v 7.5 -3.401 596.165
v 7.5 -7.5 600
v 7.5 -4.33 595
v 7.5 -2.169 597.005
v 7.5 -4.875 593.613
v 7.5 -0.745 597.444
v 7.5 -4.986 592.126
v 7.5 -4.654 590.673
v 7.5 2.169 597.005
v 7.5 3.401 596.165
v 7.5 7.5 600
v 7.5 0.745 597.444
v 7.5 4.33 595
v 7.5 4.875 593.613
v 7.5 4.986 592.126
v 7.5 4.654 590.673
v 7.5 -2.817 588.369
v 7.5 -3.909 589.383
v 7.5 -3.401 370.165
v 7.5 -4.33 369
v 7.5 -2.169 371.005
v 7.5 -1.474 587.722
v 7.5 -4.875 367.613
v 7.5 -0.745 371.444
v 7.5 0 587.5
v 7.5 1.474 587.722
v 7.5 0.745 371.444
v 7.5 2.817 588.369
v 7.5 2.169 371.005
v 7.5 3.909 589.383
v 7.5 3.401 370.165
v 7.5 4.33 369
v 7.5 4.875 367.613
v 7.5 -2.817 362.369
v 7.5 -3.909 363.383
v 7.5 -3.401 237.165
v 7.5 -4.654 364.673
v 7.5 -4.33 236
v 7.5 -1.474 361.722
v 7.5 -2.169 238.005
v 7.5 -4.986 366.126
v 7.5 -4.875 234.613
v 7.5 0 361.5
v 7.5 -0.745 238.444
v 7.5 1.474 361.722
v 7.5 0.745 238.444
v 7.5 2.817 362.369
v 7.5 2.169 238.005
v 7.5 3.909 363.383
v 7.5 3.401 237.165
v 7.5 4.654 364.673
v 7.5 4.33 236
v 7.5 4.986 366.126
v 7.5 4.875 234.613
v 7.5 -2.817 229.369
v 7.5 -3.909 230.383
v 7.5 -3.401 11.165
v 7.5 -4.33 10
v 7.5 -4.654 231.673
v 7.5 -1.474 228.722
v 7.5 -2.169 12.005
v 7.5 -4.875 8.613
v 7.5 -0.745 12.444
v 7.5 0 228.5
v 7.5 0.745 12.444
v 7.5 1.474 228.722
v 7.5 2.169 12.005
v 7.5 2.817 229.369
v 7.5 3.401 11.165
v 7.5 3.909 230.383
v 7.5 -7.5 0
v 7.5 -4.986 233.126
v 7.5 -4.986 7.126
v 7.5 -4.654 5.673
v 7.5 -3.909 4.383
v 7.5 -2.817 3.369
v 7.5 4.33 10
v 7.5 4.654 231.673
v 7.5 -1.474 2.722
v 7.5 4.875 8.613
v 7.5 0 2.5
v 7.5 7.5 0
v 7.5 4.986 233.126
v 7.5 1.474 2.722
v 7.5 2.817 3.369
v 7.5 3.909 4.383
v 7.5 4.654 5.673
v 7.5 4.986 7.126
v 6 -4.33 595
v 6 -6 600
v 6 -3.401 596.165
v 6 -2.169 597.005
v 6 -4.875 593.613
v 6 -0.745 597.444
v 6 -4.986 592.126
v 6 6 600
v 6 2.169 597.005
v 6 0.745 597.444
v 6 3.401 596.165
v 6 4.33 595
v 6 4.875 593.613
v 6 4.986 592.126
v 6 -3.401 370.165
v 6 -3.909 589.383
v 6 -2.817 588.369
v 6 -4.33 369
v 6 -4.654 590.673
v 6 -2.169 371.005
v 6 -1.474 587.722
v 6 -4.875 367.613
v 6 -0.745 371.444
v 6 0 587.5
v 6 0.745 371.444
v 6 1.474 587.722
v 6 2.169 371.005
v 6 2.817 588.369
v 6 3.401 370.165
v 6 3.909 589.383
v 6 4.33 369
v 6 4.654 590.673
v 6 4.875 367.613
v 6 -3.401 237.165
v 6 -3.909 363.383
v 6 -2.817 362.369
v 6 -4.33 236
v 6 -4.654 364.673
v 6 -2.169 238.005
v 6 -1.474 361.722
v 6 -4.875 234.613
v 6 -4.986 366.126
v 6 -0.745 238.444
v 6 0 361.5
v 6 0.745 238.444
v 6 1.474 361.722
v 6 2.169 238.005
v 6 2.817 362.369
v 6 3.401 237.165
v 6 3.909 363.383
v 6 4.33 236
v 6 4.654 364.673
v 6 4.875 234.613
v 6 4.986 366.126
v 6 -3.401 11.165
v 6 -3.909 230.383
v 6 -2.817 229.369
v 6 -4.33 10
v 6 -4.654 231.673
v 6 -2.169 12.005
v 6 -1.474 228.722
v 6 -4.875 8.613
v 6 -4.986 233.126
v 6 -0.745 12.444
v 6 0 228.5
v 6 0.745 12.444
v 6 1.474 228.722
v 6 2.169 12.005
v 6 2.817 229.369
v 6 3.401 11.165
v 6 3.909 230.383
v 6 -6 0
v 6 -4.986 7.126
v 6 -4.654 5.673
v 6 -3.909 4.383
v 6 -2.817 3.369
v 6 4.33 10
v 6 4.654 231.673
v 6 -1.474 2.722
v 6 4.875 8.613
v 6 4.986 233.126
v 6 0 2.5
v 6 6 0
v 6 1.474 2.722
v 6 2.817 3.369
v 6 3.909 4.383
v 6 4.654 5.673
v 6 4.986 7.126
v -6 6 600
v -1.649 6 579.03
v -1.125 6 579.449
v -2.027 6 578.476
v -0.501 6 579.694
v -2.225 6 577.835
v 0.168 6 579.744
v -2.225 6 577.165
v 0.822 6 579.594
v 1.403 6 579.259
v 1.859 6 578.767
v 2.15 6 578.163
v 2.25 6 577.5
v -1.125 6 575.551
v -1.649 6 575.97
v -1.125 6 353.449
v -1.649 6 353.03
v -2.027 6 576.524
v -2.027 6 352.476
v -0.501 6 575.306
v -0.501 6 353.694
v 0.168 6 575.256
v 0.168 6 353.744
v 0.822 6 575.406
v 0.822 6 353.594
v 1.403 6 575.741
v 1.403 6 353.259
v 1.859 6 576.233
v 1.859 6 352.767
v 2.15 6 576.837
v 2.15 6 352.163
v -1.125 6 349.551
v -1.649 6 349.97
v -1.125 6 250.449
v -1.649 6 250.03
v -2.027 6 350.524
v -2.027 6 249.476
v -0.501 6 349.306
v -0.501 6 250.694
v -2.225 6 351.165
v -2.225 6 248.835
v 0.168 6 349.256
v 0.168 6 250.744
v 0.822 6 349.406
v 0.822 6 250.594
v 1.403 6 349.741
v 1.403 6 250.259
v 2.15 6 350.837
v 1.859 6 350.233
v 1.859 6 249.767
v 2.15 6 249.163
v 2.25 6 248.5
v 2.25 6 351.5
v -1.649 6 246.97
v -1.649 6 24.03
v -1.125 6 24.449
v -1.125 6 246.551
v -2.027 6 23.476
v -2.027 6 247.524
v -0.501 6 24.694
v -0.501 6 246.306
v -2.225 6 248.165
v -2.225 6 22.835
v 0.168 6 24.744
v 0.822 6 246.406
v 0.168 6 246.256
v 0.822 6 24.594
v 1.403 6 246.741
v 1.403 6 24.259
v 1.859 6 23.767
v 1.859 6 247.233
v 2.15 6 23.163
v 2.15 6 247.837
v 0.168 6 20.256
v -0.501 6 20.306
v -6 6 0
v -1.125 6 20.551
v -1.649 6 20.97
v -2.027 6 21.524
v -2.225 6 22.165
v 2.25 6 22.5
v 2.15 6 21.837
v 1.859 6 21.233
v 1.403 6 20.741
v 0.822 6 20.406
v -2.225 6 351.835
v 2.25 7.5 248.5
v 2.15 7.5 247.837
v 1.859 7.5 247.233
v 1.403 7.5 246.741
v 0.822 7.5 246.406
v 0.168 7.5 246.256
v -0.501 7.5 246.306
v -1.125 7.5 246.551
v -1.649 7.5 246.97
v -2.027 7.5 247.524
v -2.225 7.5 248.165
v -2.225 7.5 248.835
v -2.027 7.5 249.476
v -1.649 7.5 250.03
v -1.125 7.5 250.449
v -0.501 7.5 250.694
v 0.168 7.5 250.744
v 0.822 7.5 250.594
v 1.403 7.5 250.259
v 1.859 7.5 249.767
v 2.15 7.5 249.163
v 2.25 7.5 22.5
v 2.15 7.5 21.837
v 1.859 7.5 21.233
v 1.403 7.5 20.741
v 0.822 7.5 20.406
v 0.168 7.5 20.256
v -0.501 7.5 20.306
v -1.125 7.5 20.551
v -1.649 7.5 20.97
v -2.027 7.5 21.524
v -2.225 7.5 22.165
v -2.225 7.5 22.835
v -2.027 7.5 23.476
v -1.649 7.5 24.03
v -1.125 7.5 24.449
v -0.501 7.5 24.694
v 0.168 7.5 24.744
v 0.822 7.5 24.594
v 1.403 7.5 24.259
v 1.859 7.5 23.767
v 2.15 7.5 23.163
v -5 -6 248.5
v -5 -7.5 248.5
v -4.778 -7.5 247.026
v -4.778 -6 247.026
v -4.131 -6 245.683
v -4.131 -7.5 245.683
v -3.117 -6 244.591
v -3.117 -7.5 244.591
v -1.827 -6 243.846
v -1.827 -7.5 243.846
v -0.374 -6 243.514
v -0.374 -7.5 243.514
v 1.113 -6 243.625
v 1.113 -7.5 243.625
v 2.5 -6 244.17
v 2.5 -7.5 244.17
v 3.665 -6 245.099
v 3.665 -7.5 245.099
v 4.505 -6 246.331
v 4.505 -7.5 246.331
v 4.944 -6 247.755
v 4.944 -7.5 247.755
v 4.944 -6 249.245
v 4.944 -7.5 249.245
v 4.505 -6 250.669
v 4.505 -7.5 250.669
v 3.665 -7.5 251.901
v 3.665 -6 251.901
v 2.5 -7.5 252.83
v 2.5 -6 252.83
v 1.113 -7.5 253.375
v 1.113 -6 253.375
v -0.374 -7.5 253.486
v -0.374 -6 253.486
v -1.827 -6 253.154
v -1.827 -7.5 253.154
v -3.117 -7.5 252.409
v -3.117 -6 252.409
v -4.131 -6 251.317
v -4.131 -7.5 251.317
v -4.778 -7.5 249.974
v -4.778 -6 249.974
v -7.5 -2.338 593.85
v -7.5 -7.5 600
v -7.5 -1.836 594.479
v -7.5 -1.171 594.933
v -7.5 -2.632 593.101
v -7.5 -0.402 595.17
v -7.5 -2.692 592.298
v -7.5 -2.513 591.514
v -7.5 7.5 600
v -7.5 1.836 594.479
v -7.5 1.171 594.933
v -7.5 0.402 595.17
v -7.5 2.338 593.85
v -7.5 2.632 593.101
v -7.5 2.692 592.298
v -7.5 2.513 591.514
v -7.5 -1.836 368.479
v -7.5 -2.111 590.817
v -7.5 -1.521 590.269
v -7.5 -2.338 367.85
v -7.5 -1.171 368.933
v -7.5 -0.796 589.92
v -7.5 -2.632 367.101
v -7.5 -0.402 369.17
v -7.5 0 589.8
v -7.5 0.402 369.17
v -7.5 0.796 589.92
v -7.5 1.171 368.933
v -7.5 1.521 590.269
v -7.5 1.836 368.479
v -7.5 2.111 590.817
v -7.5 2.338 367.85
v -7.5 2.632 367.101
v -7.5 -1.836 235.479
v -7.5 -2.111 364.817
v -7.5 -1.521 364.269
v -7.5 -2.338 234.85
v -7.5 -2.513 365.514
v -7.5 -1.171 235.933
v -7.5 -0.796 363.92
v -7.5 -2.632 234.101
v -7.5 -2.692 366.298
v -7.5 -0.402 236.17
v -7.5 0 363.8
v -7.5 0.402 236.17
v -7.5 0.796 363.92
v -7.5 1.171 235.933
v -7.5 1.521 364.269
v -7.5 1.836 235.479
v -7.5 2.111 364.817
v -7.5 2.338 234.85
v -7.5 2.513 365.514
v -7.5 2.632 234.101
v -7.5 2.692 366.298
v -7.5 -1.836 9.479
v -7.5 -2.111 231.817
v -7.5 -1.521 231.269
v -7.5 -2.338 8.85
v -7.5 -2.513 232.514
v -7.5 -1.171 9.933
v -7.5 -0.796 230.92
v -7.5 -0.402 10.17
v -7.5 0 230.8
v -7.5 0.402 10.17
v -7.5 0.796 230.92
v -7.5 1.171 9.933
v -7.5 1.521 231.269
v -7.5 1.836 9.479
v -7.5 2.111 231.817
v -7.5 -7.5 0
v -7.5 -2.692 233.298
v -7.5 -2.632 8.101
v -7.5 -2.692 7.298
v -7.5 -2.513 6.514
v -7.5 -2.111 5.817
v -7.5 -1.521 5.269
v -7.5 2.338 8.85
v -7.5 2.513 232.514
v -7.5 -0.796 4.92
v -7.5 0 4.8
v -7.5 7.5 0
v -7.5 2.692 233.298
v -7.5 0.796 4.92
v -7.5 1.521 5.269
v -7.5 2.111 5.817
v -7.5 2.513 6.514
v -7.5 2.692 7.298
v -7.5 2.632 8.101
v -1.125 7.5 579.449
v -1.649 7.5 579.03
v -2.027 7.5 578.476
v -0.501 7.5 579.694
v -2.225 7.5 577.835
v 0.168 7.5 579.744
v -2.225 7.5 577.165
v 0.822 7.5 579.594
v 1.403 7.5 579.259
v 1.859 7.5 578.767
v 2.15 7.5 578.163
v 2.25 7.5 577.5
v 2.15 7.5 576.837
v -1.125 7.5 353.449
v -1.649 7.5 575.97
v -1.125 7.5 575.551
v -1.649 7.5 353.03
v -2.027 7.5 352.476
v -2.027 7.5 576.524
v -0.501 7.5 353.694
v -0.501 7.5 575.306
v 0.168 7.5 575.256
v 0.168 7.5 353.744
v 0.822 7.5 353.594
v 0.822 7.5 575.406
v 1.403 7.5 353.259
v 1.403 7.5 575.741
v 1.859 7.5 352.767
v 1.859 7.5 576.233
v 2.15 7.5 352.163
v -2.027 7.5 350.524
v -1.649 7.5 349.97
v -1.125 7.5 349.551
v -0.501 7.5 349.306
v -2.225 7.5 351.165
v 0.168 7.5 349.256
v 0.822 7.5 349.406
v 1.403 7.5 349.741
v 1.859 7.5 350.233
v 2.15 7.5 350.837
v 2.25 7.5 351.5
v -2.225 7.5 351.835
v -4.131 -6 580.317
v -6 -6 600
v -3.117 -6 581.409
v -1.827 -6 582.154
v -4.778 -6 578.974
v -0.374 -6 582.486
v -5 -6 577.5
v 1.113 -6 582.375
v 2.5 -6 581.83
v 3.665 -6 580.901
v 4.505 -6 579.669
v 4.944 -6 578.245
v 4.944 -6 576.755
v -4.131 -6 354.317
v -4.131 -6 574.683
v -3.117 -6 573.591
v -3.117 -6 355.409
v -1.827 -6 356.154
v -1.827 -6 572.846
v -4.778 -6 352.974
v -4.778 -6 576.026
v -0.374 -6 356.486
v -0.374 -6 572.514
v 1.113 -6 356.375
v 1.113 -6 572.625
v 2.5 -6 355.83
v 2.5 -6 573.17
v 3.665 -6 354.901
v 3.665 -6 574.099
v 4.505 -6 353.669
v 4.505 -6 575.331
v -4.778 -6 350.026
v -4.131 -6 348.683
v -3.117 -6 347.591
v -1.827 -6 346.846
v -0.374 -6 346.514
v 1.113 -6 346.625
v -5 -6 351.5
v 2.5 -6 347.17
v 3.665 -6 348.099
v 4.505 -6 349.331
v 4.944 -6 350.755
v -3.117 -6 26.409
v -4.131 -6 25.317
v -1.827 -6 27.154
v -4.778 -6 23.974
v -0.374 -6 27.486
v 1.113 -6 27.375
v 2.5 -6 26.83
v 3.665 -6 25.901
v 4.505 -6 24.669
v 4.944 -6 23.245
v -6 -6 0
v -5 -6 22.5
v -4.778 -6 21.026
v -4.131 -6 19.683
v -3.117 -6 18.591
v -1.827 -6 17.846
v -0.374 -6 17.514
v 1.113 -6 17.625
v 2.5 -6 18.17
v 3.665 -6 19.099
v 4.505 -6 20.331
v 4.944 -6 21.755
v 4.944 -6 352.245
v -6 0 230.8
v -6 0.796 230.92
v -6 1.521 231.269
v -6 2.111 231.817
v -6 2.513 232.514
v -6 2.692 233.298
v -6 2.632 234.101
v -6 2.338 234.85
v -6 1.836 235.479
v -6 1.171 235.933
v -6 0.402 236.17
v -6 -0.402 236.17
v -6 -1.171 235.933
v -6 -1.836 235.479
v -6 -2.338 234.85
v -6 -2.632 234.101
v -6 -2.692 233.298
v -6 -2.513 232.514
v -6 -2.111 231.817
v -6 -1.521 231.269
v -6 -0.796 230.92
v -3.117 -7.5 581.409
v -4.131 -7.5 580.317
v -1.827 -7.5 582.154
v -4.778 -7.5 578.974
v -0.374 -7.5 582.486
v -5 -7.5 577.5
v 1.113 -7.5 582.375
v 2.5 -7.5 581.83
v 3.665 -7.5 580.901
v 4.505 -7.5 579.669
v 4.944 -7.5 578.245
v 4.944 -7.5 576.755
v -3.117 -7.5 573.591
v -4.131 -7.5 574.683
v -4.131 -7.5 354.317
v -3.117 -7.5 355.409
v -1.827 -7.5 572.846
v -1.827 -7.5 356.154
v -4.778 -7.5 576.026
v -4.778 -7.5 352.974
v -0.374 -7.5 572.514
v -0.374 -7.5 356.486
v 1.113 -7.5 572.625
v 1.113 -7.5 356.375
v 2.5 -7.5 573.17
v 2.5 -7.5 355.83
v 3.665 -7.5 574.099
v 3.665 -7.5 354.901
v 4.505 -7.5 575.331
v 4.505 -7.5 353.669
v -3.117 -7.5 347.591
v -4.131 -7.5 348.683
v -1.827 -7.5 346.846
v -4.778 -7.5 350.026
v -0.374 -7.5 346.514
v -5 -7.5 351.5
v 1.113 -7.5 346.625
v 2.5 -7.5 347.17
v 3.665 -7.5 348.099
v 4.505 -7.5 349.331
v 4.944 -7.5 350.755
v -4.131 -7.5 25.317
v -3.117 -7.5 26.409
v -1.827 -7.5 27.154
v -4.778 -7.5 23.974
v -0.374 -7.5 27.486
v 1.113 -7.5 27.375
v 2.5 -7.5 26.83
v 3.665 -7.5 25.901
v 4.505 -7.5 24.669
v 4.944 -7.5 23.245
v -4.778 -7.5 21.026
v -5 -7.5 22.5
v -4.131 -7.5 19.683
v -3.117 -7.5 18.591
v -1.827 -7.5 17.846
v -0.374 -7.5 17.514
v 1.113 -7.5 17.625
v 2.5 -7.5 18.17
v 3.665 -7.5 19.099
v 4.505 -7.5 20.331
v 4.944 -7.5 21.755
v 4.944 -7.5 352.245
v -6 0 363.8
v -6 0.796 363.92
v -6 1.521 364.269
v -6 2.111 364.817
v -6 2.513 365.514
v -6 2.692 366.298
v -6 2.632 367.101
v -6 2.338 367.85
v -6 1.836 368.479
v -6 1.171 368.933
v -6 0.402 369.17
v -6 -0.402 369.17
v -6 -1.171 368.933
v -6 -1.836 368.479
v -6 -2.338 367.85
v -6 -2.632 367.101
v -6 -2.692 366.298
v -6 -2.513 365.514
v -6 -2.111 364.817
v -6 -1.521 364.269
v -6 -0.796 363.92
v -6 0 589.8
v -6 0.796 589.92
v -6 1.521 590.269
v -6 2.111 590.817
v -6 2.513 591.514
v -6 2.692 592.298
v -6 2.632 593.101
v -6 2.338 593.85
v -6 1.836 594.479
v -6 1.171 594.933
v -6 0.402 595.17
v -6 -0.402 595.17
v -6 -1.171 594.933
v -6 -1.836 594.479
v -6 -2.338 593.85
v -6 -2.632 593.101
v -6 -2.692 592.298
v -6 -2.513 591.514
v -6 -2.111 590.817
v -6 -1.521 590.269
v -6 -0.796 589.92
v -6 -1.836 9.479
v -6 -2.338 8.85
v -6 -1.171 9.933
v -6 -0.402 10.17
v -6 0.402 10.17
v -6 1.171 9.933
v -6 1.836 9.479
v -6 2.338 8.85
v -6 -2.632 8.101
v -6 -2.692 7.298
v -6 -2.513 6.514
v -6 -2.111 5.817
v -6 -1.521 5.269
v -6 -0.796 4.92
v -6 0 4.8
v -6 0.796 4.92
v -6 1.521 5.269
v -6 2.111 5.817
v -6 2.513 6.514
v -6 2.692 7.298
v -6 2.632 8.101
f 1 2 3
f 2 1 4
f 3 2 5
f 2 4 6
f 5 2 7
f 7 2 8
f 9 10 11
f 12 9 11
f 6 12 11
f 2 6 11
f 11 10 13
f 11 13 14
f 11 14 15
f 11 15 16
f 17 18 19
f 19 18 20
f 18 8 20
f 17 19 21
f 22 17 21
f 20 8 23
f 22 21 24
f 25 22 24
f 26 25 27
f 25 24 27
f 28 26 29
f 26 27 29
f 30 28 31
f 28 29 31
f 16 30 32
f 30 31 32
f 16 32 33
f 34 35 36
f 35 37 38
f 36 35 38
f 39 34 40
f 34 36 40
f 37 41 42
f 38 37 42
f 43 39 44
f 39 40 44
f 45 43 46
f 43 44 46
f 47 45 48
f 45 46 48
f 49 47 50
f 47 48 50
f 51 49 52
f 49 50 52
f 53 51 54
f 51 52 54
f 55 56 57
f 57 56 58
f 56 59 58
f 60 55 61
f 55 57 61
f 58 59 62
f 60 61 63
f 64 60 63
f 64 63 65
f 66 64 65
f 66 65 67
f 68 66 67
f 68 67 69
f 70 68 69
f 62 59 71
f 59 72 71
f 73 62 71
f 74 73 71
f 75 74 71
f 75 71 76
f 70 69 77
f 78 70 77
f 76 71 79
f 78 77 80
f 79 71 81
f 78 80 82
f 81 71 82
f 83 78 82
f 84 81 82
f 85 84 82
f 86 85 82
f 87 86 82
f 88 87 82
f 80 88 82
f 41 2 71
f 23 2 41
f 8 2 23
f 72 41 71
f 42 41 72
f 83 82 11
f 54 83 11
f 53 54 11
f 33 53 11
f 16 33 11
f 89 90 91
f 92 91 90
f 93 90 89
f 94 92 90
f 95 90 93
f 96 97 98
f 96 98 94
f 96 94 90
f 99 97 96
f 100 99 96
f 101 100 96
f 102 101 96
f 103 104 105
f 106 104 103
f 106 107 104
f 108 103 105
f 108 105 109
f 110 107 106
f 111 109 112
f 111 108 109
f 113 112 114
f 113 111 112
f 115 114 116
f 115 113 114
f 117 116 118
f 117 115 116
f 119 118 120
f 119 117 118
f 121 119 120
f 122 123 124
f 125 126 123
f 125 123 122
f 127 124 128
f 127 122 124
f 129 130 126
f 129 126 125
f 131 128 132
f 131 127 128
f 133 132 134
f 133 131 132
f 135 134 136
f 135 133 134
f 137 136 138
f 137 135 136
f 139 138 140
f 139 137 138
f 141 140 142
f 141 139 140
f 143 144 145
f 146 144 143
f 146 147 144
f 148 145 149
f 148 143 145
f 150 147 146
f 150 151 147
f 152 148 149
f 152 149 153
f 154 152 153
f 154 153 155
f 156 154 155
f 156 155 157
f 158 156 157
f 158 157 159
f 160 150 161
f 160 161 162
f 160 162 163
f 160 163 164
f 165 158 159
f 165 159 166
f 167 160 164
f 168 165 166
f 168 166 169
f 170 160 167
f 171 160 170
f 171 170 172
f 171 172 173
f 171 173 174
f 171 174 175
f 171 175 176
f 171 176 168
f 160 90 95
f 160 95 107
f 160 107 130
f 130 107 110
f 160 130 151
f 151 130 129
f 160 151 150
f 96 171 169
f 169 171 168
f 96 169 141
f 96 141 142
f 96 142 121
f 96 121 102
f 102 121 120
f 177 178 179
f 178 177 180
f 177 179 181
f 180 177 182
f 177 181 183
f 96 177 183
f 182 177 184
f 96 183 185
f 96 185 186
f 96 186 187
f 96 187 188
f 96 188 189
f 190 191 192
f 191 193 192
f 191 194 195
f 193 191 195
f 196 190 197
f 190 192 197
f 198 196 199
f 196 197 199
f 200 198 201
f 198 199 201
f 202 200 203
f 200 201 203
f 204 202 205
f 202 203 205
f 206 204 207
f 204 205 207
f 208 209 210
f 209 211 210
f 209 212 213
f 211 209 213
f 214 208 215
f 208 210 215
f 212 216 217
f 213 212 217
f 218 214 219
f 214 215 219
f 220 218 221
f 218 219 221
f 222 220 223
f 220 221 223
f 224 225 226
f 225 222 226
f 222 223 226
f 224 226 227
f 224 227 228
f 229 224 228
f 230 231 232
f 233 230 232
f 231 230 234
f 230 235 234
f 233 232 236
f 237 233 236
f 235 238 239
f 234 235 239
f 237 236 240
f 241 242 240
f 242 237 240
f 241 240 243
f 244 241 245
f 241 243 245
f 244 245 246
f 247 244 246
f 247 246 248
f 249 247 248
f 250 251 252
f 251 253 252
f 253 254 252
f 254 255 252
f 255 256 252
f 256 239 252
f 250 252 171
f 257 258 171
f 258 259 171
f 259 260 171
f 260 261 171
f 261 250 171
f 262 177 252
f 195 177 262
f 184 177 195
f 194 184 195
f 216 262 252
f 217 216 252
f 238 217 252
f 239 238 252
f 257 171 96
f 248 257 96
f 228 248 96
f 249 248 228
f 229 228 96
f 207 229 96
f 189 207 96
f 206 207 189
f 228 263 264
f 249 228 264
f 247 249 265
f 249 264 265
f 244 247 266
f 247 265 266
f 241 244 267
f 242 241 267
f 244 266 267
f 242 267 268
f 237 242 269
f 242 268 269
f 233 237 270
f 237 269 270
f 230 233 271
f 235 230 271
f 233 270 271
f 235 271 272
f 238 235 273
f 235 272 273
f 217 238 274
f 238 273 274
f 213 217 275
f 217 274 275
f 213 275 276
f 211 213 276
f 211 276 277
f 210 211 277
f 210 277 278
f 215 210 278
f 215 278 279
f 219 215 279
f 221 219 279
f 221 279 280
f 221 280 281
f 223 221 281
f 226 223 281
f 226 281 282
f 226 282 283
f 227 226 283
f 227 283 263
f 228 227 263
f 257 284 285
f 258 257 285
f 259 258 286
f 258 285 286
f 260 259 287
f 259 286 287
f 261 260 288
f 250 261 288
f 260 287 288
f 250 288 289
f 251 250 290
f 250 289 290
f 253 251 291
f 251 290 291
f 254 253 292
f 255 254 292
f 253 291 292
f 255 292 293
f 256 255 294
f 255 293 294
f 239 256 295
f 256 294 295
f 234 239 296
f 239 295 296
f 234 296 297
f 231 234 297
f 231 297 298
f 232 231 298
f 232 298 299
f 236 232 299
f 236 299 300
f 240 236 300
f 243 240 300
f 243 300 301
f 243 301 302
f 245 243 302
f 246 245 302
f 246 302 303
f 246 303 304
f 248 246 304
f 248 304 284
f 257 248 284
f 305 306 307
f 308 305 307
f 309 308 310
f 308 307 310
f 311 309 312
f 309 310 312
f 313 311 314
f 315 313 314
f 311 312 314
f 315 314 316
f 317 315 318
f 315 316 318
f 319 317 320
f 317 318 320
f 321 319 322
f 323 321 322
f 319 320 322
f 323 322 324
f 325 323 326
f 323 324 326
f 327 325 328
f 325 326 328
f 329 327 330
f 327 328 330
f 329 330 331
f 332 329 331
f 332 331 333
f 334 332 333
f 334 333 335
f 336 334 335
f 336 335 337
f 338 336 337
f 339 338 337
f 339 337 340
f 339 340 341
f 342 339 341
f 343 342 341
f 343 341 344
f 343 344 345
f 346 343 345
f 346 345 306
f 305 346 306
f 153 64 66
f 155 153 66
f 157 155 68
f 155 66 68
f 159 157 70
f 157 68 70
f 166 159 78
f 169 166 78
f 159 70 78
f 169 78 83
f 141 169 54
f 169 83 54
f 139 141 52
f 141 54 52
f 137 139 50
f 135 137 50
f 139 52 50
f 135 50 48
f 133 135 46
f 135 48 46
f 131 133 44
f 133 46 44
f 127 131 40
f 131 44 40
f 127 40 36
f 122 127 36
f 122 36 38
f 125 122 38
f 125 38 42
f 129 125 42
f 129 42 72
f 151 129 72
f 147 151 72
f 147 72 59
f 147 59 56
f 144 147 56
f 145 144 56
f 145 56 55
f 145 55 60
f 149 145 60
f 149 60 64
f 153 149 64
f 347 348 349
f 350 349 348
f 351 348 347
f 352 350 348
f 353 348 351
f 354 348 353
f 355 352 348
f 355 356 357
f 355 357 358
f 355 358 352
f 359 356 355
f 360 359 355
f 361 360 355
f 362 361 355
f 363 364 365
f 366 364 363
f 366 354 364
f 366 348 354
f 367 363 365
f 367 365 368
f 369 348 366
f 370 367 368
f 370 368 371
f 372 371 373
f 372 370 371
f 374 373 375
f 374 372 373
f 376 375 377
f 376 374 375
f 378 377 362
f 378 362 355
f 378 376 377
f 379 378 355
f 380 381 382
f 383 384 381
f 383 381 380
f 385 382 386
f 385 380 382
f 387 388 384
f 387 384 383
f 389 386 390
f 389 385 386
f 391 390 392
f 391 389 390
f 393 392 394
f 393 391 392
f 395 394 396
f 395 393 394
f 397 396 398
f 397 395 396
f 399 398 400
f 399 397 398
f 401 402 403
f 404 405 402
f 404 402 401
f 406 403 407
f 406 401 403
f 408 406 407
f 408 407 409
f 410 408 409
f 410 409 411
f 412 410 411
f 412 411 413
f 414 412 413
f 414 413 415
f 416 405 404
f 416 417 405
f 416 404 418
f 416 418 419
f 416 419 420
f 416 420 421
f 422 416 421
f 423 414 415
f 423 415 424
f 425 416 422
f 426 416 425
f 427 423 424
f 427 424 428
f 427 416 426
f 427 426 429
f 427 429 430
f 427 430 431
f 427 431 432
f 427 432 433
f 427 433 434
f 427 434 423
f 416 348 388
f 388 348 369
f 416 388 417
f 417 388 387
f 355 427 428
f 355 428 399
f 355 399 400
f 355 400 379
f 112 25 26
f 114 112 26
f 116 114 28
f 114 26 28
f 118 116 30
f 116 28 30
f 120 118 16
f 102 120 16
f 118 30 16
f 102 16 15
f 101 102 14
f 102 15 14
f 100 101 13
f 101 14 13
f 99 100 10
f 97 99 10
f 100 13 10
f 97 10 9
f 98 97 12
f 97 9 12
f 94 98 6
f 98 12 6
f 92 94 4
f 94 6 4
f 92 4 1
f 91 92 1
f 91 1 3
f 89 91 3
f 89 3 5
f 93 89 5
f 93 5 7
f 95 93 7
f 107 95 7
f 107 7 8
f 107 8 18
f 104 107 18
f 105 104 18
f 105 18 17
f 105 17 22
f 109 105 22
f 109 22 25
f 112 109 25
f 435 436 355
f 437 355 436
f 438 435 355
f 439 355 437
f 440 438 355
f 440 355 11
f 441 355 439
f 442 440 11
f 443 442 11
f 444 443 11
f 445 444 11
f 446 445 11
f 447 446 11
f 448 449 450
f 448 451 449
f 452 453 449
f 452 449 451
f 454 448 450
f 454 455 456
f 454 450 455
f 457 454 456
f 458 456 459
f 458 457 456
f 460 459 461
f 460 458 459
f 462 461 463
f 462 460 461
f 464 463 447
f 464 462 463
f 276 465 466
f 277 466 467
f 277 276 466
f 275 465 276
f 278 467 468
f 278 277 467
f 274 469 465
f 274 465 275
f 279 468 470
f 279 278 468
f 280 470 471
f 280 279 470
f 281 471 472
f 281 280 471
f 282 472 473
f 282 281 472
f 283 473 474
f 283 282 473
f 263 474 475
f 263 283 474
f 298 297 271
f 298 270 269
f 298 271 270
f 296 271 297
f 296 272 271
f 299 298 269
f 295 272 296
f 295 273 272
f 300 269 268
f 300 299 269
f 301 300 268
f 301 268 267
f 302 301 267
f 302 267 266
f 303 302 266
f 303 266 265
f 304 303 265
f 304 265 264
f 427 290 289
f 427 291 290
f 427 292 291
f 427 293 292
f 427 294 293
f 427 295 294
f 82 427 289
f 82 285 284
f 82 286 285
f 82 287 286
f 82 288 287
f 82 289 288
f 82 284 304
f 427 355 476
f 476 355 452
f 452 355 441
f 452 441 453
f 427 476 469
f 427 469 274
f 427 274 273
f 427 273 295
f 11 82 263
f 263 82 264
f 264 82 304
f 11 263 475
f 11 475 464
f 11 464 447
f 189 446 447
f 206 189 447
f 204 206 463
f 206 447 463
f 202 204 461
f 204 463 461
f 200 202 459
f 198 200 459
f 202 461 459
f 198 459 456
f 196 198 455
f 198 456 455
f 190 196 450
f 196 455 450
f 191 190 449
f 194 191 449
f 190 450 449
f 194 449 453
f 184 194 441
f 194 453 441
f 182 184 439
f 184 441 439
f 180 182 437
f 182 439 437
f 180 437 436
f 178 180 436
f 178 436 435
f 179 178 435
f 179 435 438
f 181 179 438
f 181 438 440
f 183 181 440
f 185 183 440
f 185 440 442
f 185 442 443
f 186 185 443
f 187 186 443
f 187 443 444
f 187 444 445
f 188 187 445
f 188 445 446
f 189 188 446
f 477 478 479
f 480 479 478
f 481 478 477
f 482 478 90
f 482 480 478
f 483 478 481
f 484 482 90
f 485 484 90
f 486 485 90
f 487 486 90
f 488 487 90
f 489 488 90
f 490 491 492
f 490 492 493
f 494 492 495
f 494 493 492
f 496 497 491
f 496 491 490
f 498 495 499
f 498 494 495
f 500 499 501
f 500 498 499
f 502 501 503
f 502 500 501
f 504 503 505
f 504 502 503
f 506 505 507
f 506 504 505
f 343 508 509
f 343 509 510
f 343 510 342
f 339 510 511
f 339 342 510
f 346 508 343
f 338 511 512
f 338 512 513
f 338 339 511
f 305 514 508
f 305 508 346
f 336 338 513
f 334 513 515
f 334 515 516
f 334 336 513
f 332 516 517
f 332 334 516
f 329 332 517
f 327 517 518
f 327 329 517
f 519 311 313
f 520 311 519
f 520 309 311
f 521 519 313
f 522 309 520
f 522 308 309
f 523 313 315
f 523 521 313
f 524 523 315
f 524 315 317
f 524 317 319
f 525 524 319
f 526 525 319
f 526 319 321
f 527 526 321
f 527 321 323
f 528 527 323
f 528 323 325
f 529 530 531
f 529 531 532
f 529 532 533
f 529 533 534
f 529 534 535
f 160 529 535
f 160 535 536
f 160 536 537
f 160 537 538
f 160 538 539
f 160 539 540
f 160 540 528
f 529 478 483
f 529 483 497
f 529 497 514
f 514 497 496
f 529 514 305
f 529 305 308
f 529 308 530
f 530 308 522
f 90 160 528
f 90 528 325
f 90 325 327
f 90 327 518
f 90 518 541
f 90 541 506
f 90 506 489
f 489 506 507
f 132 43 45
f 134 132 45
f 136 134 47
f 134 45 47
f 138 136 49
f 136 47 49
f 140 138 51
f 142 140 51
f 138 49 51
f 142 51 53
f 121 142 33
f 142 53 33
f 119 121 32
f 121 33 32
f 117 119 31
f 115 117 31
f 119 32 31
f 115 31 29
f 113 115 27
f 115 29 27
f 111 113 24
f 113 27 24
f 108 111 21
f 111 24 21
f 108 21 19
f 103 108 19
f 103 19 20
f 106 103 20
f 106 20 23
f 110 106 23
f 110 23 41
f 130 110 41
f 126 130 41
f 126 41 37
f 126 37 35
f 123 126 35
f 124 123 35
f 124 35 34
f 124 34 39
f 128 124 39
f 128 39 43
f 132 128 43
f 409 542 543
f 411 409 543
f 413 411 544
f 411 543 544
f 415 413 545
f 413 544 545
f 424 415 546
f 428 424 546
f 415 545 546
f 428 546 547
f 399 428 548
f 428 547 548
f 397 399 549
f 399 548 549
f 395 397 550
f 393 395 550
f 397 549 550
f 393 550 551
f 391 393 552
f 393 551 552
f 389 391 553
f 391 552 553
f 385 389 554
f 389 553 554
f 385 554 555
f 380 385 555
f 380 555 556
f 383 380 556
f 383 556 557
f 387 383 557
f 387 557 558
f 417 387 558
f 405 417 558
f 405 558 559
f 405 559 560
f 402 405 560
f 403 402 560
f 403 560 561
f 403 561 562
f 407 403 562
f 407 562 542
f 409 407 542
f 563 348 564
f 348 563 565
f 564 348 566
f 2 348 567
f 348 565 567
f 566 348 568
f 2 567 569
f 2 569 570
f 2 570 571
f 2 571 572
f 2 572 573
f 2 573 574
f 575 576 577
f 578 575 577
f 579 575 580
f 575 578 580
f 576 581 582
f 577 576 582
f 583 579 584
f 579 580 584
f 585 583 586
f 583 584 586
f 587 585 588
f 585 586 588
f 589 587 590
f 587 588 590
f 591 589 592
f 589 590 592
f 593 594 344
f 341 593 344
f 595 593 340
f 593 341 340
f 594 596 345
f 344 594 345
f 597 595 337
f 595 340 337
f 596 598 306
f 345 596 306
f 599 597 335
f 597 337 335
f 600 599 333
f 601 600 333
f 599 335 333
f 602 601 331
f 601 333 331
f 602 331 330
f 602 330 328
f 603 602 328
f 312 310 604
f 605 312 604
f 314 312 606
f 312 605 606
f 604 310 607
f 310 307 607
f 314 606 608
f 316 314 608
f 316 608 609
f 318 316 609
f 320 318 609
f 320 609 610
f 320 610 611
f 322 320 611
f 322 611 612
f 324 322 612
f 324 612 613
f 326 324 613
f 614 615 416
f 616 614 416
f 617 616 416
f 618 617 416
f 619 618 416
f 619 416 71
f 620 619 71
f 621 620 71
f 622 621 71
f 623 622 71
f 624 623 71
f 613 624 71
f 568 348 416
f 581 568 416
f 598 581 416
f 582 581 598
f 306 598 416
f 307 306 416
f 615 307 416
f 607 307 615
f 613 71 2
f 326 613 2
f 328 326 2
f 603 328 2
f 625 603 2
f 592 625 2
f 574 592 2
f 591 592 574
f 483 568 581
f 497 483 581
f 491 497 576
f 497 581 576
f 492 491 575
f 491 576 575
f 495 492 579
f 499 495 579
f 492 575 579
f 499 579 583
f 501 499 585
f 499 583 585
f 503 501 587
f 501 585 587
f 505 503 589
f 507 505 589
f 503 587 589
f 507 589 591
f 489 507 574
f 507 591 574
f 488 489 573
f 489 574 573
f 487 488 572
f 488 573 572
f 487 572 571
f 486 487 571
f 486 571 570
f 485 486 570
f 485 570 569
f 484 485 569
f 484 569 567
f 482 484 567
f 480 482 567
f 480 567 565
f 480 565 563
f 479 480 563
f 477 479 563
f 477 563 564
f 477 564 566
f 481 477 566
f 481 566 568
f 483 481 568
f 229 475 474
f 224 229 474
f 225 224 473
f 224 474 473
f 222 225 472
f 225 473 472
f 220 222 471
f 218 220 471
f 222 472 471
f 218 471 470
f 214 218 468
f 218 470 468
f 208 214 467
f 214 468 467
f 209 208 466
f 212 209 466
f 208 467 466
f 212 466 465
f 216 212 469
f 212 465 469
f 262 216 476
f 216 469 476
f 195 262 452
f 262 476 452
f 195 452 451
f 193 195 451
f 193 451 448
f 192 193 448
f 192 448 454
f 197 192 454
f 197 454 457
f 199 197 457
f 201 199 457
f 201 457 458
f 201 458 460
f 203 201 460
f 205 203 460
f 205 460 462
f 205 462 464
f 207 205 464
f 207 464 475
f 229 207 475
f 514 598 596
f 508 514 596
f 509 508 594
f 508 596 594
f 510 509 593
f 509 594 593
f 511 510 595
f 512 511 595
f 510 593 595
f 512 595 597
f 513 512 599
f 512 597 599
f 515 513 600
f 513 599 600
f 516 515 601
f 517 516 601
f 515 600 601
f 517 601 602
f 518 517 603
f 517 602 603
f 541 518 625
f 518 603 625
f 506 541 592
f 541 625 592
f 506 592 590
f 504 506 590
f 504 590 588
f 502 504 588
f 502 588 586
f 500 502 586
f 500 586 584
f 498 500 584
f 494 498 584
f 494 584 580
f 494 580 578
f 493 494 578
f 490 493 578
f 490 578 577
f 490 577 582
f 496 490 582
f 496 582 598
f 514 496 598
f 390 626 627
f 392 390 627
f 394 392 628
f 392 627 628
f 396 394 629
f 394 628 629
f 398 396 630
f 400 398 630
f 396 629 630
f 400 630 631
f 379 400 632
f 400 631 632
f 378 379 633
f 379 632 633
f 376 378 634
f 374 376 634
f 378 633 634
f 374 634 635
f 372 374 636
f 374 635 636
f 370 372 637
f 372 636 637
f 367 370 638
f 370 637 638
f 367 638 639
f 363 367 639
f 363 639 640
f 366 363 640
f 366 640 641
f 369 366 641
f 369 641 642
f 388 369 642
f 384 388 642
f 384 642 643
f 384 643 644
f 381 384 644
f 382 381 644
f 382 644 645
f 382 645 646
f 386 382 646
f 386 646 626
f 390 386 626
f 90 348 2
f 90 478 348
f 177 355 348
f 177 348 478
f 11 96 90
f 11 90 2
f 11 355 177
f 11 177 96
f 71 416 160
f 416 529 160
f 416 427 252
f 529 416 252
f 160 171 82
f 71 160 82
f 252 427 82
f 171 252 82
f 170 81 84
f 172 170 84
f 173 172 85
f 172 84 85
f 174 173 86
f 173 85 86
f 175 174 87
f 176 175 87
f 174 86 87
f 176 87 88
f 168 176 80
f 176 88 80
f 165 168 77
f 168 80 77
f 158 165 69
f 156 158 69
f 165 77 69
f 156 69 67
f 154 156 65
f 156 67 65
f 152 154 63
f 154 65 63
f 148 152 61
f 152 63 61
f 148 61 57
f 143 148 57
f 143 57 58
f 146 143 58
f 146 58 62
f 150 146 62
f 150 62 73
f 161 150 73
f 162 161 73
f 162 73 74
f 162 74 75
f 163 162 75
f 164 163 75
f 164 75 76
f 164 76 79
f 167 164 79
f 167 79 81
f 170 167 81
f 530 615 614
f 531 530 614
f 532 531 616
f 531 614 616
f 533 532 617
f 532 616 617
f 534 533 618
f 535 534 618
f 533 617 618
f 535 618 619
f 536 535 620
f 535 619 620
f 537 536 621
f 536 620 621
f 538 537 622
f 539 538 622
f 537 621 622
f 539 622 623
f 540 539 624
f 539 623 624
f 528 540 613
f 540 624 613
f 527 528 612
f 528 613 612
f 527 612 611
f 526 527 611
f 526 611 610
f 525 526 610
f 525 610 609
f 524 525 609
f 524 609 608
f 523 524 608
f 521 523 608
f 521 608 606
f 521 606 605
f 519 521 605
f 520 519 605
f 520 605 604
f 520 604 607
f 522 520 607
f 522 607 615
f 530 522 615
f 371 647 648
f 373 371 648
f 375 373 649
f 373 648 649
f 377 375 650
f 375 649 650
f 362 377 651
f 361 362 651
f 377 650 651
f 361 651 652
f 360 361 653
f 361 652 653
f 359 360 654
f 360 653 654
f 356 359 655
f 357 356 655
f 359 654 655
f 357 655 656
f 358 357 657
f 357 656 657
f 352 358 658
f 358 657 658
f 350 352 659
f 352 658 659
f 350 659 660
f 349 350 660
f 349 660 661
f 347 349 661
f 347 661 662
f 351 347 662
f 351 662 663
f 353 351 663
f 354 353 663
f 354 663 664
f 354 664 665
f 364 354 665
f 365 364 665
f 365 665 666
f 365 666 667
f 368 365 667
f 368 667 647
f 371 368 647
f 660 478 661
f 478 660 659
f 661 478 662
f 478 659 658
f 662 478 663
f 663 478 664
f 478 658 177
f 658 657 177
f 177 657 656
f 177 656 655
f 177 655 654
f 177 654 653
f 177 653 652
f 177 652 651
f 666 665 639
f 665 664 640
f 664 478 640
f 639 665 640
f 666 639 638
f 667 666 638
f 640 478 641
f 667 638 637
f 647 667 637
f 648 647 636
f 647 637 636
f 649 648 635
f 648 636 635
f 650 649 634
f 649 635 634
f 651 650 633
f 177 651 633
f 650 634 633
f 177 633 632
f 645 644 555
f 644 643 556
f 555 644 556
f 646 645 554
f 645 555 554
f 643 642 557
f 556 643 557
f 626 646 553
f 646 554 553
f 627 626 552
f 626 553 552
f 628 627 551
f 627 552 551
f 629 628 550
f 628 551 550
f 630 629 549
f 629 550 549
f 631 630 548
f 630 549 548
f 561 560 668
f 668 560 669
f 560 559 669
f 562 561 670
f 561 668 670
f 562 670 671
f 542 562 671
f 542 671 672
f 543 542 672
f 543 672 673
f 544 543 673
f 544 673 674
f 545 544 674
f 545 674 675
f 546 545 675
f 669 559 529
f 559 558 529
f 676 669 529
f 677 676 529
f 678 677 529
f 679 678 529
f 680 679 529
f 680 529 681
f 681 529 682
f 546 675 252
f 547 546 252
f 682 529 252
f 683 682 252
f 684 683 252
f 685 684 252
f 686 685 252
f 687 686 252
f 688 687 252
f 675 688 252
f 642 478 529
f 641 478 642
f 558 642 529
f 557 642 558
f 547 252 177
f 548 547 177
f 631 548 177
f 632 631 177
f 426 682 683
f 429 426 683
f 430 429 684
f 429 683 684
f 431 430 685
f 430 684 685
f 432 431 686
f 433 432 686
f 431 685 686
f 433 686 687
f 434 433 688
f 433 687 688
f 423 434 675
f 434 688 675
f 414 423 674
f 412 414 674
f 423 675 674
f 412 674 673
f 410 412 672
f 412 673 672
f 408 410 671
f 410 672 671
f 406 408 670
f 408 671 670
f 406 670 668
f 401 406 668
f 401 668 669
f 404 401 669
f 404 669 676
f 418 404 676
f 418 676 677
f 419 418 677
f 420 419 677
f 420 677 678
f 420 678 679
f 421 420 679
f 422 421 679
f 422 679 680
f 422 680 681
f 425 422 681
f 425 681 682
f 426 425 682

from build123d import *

# Parameters (mm, degrees)
SKETCH_1_W          = 15
SKETCH_1_H          = 15
SKETCH_1_W_2        = 12
SKETCH_1_H_2        = 12
EXTRUDE_1_DEPTH     = 600
SKETCH_2_R          = 2.7
CUT_EXTRUDE_1_DEPTH = 25
SKETCH_3_R          = 2.25
CUT_EXTRUDE_2_DEPTH = 25
SKETCH_4_R          = 2.7
CUT_EXTRUDE_3_DEPTH = 20
SKETCH_5_R          = 5
CUT_EXTRUDE_4_DEPTH = 10
SKETCH_6_R          = 5
CUT_EXTRUDE_5_DEPTH = 10


with BuildPart() as part:
    # ｽｹｯﾁ1 → ﾎﾞｽ - 押し出し1 (new body)
    with BuildSketch(Plane.XY):
        Rectangle(SKETCH_1_W, SKETCH_1_H)
        Rectangle(SKETCH_1_W_2, SKETCH_1_H_2, mode=Mode.SUBTRACT)
    extrude(amount=EXTRUDE_1_DEPTH)

    # ｽｹｯﾁ2 → ｶｯﾄ - 押し出し1 (cut)
    with BuildSketch(Plane(origin=(7.5, 0, 0), x_dir=(0, 0, -1), z_dir=(1, 0, 0))):
        with Locations((-592.5, 0)):
            Circle(SKETCH_2_R)
        with Locations((-7.5, 0)):
            Circle(SKETCH_2_R)
    extrude(amount=-CUT_EXTRUDE_1_DEPTH, mode=Mode.SUBTRACT)

    # ｽｹｯﾁ3 → ｶｯﾄ - 押し出し2 (cut)
    with BuildSketch(Plane(origin=(0, 7.5, 0), x_dir=(1, 0, 0), z_dir=(0, 1, 0))):
        with Locations((0, -22.5)):
            Circle(SKETCH_3_R)
        with Locations((0, -577.5)):
            Circle(SKETCH_3_R)
        with Locations((0, -248.5)):
            Circle(SKETCH_3_R)
        with Locations((0, -351.5)):
            Circle(SKETCH_3_R)
    extrude(amount=-CUT_EXTRUDE_2_DEPTH, mode=Mode.SUBTRACT)

    # ｽｹｯﾁ4 → ｶｯﾄ - 押し出し3 (cut)
    with BuildSketch(Plane(origin=(7.5, 0, 0), x_dir=(0, 0, -1), z_dir=(1, 0, 0))):
        with Locations((-366.5, 0)):
            Circle(SKETCH_4_R)
        with Locations((-233.5, 0)):
            Circle(SKETCH_4_R)
    extrude(amount=-CUT_EXTRUDE_3_DEPTH, mode=Mode.SUBTRACT)

    # ｽｹｯﾁ5 → ｶｯﾄ - 押し出し4 (cut)
    with BuildSketch(Plane(origin=(7.5, 0, 0), x_dir=(0, 0, -1), z_dir=(1, 0, 0))):
        with Locations((-592.5, 0)):
            Circle(SKETCH_5_R)
        with Locations((-366.5, 0)):
            Circle(SKETCH_5_R)
        with Locations((-233.5, 0)):
            Circle(SKETCH_5_R)
        with Locations((-7.5, 0)):
            Circle(SKETCH_5_R)
    extrude(amount=-CUT_EXTRUDE_4_DEPTH, mode=Mode.SUBTRACT)

    # ｽｹｯﾁ6 → ｶｯﾄ - 押し出し5 (cut)
    with BuildSketch(Plane(origin=(0, -7.5, 0), x_dir=(-1, 0, 0), z_dir=(0, -1, 0))):
        with Locations((0, -577.5)):
            Circle(SKETCH_6_R)
        with Locations((0, -22.5)):
            Circle(SKETCH_6_R)
        with Locations((0, -248.5)):
            Circle(SKETCH_6_R)
        with Locations((0, -351.5)):
            Circle(SKETCH_6_R)
    extrude(amount=-CUT_EXTRUDE_5_DEPTH, mode=Mode.SUBTRACT)


solid = part.part
